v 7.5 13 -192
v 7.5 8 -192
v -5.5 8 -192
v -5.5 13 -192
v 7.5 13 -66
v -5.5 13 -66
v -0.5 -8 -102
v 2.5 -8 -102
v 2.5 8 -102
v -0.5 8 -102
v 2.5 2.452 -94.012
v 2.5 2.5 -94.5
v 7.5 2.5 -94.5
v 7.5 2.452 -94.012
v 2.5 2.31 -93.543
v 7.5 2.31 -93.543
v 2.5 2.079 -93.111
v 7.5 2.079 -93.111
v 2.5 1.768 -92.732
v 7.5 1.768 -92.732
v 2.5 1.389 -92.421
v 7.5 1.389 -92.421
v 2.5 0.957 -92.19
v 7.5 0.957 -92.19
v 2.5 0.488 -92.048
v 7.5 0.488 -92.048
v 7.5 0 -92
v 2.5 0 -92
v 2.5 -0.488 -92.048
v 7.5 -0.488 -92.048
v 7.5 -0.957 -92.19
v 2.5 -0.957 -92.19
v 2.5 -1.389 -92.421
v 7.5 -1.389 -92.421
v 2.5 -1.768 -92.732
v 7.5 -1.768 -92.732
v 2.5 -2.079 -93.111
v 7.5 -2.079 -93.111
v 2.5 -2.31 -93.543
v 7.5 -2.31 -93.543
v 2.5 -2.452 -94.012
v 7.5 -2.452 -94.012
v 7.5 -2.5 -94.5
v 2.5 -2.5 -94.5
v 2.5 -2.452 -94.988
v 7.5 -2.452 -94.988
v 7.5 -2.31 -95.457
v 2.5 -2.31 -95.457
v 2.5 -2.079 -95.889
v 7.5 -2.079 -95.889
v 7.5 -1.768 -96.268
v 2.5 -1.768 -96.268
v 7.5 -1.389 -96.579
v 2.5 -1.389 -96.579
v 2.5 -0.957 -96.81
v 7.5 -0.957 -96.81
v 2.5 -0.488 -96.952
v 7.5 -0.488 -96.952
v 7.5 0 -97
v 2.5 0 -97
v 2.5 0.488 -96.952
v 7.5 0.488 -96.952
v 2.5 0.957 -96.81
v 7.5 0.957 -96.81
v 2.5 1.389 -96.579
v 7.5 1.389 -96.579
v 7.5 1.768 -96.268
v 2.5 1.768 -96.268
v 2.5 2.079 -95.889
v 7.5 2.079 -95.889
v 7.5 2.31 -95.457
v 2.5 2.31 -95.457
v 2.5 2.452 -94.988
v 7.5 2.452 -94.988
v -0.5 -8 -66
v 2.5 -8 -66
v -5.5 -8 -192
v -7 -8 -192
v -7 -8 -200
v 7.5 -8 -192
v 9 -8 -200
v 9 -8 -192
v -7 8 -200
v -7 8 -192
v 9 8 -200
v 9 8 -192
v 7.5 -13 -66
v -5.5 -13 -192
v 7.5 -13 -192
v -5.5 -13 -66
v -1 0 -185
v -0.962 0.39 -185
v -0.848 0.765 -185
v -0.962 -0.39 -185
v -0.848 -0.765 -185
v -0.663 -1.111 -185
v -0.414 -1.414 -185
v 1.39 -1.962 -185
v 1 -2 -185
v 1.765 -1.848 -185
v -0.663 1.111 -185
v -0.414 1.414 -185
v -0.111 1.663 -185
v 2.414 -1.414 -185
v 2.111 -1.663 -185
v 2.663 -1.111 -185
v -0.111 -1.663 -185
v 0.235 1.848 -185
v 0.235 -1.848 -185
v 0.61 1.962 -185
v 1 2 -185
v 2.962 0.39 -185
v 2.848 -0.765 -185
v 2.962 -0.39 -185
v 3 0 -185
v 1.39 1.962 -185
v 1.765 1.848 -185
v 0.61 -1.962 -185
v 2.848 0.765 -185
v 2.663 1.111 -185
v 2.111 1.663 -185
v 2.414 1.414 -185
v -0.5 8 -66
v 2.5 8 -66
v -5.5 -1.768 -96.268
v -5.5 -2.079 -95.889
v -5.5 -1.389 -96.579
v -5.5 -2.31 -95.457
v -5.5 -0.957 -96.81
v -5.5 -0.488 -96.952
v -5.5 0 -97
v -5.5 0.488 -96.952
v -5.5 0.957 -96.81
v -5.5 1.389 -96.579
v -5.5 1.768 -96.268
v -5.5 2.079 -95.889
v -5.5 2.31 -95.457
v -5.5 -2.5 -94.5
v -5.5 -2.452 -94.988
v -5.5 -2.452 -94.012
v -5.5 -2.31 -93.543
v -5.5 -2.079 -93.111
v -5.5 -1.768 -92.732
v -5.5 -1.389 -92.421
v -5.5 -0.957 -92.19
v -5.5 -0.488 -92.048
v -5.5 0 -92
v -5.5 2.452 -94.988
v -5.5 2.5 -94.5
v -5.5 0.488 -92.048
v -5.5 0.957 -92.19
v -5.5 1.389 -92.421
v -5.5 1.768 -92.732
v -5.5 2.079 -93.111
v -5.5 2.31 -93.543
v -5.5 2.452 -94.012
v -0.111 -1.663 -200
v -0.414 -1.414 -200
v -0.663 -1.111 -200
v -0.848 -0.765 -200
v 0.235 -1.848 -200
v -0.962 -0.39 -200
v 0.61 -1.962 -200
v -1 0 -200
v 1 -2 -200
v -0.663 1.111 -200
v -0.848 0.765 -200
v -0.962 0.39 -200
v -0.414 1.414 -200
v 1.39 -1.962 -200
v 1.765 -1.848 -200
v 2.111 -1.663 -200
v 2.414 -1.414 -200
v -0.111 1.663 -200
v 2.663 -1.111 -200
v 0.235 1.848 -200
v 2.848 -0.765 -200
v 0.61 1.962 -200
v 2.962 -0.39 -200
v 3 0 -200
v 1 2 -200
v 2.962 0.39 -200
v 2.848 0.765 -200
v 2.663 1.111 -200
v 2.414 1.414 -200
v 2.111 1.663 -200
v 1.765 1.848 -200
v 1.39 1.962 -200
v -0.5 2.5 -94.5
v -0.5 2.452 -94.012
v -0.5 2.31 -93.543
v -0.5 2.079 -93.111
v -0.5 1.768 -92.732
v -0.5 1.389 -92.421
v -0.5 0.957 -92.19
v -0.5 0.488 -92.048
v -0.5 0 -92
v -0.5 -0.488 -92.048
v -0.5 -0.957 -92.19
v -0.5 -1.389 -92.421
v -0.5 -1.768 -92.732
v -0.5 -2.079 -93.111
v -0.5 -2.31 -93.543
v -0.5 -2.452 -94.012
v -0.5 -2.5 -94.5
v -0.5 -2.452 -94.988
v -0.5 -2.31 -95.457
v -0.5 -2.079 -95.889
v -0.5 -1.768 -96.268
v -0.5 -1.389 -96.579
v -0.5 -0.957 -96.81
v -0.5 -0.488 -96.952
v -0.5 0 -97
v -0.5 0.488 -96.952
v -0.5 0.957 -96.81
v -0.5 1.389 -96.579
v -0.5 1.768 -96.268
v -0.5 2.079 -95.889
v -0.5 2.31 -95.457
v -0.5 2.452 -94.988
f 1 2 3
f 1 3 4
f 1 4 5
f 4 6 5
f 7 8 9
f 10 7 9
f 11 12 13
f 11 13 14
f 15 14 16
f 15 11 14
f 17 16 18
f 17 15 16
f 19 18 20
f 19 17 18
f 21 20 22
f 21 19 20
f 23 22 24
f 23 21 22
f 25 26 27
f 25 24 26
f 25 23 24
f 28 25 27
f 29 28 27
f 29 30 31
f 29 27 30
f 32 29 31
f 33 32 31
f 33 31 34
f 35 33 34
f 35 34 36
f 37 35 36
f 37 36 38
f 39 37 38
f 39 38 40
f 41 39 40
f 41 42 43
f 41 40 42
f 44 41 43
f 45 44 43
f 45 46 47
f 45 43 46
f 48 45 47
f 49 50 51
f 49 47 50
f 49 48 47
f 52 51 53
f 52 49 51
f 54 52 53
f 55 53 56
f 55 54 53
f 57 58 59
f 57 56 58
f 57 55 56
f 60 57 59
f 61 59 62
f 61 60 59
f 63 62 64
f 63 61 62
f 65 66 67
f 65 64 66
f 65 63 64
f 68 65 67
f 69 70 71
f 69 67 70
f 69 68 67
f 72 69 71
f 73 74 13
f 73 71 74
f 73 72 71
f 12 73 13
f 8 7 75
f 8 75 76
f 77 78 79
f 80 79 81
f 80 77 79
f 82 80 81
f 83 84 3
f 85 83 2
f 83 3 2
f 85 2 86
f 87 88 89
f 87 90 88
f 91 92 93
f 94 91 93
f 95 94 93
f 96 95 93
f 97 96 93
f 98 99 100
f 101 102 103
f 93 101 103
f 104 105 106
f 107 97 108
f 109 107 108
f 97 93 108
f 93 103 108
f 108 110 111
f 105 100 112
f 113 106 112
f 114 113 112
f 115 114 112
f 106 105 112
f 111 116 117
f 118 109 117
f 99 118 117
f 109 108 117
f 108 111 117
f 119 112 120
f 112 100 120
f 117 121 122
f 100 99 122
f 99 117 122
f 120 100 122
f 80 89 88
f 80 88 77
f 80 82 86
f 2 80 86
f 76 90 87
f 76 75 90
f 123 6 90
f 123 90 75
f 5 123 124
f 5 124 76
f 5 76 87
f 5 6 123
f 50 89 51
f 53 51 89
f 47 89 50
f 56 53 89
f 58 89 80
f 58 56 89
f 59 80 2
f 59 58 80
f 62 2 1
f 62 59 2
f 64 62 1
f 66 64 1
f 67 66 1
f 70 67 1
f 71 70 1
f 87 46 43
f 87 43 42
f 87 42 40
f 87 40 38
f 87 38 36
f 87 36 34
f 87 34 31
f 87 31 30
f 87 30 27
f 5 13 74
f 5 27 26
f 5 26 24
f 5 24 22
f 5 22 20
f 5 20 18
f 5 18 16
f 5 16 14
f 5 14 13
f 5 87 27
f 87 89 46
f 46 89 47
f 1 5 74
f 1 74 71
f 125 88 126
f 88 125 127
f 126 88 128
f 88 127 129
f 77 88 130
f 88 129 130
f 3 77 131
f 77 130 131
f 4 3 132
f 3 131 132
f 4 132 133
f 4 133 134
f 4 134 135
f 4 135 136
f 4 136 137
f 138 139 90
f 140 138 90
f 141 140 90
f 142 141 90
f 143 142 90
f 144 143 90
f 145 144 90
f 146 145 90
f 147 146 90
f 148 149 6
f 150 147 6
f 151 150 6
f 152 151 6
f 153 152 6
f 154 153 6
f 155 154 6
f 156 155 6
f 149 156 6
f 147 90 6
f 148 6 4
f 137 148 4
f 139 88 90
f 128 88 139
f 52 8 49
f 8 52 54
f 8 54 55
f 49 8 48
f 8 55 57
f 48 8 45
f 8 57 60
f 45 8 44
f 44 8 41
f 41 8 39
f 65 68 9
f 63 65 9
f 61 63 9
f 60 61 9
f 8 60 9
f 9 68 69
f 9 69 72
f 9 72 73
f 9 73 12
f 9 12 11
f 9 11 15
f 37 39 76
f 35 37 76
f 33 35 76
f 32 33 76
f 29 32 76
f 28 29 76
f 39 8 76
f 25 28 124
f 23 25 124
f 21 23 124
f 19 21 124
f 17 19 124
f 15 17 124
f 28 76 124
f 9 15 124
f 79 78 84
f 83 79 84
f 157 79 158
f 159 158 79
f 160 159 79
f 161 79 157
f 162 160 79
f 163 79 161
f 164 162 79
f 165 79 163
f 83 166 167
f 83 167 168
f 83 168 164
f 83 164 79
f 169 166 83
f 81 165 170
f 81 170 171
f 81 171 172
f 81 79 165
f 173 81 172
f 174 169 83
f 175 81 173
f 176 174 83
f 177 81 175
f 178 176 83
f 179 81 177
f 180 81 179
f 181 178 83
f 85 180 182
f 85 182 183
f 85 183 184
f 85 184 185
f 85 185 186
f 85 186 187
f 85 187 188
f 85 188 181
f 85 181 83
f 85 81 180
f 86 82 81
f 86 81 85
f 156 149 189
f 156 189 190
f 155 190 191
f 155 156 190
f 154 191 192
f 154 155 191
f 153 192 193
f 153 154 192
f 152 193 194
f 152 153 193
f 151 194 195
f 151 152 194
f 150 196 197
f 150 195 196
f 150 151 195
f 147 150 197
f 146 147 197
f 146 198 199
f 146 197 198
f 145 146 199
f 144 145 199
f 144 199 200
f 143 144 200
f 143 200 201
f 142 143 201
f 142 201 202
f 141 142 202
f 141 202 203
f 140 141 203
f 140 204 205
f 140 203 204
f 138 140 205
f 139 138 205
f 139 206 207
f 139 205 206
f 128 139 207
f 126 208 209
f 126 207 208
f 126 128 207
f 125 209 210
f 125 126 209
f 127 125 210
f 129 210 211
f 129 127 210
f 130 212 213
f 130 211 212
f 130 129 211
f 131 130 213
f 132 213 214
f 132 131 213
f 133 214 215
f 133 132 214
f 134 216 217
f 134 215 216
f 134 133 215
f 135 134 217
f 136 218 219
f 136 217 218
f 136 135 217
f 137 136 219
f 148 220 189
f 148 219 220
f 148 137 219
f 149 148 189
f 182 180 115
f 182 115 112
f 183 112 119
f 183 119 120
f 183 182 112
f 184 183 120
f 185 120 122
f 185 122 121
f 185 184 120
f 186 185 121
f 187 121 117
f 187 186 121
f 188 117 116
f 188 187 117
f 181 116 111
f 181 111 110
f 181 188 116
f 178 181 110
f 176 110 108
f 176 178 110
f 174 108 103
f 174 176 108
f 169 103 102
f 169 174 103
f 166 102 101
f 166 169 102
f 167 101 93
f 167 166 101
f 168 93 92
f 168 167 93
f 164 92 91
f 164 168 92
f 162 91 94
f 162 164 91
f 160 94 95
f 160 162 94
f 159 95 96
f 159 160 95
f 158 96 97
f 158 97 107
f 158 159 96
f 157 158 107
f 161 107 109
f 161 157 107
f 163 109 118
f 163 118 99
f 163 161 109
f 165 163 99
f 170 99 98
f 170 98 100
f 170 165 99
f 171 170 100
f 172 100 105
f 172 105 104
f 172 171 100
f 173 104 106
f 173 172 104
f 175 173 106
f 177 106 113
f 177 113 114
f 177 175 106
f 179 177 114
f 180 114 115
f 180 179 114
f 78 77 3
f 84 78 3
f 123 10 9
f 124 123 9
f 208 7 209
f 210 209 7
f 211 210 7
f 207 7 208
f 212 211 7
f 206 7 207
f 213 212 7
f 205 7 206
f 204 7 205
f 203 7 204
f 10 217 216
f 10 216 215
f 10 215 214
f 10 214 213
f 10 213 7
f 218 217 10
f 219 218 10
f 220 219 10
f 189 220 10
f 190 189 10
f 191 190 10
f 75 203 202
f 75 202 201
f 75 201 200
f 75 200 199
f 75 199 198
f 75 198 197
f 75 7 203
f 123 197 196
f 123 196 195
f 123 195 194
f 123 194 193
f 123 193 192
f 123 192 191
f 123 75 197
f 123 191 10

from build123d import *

# Parameters (mm, degrees)
SKETCH002_W       = 13
SKETCH002_H       = 26
SKETCH002_W_2     = 3
SKETCH002_H_2     = 16
PAD002_DEPTH      = 36
CYLINDER002_R     = 2.5
CYLINDER002_DEPTH = 14
SKETCH003_W       = 26
SKETCH003_H       = 13
PAD003_DEPTH      = 90
SKETCH004_W       = 16
SKETCH004_H       = 16
PAD004_DEPTH      = 8
CYLINDER003_R     = 2
CYLINDER003_DEPTH = 15


with BuildPart() as part:
    # Sketch002 → Pad002 (new body)
    with BuildSketch(Plane.XY):
        with Locations((1, 0)):
            Rectangle(SKETCH002_W, SKETCH002_H)
        with Locations((1, 0)):
            Rectangle(SKETCH002_W_2, SKETCH002_H_2, mode=Mode.SUBTRACT)
    extrude(amount=-PAD002_DEPTH)

    # Cylinder002 → Cylinder002 (cut)
    with BuildSketch(Plane(origin=(-6, 0, -28.5), x_dir=(0, 1, 0), z_dir=(1, 0, 0))):
        Circle(CYLINDER002_R)
    extrude(amount=CYLINDER002_DEPTH, mode=Mode.SUBTRACT)

    # Sketch003 (on Face4 of Cylinder002) → Pad003 (join)
    with BuildSketch(Plane(origin=(-6, 0, -36), x_dir=(0, 1, 0), z_dir=(0, 0, -1))):
        with Locations((0, 7)):
            Rectangle(SKETCH003_W, SKETCH003_H)
    extrude(amount=PAD003_DEPTH)

    # Sketch004 (on Face14 of Pad003) → Pad004 (join)
    with BuildSketch(Plane(origin=(-6, 0, -126), x_dir=(0, 1, 0), z_dir=(0, 0, -1))):
        with Locations((0, 7)):
            Rectangle(SKETCH004_W, SKETCH004_H)
    extrude(amount=PAD004_DEPTH)

    # Cylinder003 → Cylinder003 (cut)
    with BuildSketch(Plane(origin=(1, 0, -134), x_dir=(1, 0, 0), z_dir=(0, 0, 1))):
        Circle(CYLINDER003_R)
    extrude(amount=CYLINDER003_DEPTH, mode=Mode.SUBTRACT)


with BuildPart() as part_1:
    # Body002 placement: moved
    add(part.part.moved(Location((0, 0, -66))))


solid = part_1.part
